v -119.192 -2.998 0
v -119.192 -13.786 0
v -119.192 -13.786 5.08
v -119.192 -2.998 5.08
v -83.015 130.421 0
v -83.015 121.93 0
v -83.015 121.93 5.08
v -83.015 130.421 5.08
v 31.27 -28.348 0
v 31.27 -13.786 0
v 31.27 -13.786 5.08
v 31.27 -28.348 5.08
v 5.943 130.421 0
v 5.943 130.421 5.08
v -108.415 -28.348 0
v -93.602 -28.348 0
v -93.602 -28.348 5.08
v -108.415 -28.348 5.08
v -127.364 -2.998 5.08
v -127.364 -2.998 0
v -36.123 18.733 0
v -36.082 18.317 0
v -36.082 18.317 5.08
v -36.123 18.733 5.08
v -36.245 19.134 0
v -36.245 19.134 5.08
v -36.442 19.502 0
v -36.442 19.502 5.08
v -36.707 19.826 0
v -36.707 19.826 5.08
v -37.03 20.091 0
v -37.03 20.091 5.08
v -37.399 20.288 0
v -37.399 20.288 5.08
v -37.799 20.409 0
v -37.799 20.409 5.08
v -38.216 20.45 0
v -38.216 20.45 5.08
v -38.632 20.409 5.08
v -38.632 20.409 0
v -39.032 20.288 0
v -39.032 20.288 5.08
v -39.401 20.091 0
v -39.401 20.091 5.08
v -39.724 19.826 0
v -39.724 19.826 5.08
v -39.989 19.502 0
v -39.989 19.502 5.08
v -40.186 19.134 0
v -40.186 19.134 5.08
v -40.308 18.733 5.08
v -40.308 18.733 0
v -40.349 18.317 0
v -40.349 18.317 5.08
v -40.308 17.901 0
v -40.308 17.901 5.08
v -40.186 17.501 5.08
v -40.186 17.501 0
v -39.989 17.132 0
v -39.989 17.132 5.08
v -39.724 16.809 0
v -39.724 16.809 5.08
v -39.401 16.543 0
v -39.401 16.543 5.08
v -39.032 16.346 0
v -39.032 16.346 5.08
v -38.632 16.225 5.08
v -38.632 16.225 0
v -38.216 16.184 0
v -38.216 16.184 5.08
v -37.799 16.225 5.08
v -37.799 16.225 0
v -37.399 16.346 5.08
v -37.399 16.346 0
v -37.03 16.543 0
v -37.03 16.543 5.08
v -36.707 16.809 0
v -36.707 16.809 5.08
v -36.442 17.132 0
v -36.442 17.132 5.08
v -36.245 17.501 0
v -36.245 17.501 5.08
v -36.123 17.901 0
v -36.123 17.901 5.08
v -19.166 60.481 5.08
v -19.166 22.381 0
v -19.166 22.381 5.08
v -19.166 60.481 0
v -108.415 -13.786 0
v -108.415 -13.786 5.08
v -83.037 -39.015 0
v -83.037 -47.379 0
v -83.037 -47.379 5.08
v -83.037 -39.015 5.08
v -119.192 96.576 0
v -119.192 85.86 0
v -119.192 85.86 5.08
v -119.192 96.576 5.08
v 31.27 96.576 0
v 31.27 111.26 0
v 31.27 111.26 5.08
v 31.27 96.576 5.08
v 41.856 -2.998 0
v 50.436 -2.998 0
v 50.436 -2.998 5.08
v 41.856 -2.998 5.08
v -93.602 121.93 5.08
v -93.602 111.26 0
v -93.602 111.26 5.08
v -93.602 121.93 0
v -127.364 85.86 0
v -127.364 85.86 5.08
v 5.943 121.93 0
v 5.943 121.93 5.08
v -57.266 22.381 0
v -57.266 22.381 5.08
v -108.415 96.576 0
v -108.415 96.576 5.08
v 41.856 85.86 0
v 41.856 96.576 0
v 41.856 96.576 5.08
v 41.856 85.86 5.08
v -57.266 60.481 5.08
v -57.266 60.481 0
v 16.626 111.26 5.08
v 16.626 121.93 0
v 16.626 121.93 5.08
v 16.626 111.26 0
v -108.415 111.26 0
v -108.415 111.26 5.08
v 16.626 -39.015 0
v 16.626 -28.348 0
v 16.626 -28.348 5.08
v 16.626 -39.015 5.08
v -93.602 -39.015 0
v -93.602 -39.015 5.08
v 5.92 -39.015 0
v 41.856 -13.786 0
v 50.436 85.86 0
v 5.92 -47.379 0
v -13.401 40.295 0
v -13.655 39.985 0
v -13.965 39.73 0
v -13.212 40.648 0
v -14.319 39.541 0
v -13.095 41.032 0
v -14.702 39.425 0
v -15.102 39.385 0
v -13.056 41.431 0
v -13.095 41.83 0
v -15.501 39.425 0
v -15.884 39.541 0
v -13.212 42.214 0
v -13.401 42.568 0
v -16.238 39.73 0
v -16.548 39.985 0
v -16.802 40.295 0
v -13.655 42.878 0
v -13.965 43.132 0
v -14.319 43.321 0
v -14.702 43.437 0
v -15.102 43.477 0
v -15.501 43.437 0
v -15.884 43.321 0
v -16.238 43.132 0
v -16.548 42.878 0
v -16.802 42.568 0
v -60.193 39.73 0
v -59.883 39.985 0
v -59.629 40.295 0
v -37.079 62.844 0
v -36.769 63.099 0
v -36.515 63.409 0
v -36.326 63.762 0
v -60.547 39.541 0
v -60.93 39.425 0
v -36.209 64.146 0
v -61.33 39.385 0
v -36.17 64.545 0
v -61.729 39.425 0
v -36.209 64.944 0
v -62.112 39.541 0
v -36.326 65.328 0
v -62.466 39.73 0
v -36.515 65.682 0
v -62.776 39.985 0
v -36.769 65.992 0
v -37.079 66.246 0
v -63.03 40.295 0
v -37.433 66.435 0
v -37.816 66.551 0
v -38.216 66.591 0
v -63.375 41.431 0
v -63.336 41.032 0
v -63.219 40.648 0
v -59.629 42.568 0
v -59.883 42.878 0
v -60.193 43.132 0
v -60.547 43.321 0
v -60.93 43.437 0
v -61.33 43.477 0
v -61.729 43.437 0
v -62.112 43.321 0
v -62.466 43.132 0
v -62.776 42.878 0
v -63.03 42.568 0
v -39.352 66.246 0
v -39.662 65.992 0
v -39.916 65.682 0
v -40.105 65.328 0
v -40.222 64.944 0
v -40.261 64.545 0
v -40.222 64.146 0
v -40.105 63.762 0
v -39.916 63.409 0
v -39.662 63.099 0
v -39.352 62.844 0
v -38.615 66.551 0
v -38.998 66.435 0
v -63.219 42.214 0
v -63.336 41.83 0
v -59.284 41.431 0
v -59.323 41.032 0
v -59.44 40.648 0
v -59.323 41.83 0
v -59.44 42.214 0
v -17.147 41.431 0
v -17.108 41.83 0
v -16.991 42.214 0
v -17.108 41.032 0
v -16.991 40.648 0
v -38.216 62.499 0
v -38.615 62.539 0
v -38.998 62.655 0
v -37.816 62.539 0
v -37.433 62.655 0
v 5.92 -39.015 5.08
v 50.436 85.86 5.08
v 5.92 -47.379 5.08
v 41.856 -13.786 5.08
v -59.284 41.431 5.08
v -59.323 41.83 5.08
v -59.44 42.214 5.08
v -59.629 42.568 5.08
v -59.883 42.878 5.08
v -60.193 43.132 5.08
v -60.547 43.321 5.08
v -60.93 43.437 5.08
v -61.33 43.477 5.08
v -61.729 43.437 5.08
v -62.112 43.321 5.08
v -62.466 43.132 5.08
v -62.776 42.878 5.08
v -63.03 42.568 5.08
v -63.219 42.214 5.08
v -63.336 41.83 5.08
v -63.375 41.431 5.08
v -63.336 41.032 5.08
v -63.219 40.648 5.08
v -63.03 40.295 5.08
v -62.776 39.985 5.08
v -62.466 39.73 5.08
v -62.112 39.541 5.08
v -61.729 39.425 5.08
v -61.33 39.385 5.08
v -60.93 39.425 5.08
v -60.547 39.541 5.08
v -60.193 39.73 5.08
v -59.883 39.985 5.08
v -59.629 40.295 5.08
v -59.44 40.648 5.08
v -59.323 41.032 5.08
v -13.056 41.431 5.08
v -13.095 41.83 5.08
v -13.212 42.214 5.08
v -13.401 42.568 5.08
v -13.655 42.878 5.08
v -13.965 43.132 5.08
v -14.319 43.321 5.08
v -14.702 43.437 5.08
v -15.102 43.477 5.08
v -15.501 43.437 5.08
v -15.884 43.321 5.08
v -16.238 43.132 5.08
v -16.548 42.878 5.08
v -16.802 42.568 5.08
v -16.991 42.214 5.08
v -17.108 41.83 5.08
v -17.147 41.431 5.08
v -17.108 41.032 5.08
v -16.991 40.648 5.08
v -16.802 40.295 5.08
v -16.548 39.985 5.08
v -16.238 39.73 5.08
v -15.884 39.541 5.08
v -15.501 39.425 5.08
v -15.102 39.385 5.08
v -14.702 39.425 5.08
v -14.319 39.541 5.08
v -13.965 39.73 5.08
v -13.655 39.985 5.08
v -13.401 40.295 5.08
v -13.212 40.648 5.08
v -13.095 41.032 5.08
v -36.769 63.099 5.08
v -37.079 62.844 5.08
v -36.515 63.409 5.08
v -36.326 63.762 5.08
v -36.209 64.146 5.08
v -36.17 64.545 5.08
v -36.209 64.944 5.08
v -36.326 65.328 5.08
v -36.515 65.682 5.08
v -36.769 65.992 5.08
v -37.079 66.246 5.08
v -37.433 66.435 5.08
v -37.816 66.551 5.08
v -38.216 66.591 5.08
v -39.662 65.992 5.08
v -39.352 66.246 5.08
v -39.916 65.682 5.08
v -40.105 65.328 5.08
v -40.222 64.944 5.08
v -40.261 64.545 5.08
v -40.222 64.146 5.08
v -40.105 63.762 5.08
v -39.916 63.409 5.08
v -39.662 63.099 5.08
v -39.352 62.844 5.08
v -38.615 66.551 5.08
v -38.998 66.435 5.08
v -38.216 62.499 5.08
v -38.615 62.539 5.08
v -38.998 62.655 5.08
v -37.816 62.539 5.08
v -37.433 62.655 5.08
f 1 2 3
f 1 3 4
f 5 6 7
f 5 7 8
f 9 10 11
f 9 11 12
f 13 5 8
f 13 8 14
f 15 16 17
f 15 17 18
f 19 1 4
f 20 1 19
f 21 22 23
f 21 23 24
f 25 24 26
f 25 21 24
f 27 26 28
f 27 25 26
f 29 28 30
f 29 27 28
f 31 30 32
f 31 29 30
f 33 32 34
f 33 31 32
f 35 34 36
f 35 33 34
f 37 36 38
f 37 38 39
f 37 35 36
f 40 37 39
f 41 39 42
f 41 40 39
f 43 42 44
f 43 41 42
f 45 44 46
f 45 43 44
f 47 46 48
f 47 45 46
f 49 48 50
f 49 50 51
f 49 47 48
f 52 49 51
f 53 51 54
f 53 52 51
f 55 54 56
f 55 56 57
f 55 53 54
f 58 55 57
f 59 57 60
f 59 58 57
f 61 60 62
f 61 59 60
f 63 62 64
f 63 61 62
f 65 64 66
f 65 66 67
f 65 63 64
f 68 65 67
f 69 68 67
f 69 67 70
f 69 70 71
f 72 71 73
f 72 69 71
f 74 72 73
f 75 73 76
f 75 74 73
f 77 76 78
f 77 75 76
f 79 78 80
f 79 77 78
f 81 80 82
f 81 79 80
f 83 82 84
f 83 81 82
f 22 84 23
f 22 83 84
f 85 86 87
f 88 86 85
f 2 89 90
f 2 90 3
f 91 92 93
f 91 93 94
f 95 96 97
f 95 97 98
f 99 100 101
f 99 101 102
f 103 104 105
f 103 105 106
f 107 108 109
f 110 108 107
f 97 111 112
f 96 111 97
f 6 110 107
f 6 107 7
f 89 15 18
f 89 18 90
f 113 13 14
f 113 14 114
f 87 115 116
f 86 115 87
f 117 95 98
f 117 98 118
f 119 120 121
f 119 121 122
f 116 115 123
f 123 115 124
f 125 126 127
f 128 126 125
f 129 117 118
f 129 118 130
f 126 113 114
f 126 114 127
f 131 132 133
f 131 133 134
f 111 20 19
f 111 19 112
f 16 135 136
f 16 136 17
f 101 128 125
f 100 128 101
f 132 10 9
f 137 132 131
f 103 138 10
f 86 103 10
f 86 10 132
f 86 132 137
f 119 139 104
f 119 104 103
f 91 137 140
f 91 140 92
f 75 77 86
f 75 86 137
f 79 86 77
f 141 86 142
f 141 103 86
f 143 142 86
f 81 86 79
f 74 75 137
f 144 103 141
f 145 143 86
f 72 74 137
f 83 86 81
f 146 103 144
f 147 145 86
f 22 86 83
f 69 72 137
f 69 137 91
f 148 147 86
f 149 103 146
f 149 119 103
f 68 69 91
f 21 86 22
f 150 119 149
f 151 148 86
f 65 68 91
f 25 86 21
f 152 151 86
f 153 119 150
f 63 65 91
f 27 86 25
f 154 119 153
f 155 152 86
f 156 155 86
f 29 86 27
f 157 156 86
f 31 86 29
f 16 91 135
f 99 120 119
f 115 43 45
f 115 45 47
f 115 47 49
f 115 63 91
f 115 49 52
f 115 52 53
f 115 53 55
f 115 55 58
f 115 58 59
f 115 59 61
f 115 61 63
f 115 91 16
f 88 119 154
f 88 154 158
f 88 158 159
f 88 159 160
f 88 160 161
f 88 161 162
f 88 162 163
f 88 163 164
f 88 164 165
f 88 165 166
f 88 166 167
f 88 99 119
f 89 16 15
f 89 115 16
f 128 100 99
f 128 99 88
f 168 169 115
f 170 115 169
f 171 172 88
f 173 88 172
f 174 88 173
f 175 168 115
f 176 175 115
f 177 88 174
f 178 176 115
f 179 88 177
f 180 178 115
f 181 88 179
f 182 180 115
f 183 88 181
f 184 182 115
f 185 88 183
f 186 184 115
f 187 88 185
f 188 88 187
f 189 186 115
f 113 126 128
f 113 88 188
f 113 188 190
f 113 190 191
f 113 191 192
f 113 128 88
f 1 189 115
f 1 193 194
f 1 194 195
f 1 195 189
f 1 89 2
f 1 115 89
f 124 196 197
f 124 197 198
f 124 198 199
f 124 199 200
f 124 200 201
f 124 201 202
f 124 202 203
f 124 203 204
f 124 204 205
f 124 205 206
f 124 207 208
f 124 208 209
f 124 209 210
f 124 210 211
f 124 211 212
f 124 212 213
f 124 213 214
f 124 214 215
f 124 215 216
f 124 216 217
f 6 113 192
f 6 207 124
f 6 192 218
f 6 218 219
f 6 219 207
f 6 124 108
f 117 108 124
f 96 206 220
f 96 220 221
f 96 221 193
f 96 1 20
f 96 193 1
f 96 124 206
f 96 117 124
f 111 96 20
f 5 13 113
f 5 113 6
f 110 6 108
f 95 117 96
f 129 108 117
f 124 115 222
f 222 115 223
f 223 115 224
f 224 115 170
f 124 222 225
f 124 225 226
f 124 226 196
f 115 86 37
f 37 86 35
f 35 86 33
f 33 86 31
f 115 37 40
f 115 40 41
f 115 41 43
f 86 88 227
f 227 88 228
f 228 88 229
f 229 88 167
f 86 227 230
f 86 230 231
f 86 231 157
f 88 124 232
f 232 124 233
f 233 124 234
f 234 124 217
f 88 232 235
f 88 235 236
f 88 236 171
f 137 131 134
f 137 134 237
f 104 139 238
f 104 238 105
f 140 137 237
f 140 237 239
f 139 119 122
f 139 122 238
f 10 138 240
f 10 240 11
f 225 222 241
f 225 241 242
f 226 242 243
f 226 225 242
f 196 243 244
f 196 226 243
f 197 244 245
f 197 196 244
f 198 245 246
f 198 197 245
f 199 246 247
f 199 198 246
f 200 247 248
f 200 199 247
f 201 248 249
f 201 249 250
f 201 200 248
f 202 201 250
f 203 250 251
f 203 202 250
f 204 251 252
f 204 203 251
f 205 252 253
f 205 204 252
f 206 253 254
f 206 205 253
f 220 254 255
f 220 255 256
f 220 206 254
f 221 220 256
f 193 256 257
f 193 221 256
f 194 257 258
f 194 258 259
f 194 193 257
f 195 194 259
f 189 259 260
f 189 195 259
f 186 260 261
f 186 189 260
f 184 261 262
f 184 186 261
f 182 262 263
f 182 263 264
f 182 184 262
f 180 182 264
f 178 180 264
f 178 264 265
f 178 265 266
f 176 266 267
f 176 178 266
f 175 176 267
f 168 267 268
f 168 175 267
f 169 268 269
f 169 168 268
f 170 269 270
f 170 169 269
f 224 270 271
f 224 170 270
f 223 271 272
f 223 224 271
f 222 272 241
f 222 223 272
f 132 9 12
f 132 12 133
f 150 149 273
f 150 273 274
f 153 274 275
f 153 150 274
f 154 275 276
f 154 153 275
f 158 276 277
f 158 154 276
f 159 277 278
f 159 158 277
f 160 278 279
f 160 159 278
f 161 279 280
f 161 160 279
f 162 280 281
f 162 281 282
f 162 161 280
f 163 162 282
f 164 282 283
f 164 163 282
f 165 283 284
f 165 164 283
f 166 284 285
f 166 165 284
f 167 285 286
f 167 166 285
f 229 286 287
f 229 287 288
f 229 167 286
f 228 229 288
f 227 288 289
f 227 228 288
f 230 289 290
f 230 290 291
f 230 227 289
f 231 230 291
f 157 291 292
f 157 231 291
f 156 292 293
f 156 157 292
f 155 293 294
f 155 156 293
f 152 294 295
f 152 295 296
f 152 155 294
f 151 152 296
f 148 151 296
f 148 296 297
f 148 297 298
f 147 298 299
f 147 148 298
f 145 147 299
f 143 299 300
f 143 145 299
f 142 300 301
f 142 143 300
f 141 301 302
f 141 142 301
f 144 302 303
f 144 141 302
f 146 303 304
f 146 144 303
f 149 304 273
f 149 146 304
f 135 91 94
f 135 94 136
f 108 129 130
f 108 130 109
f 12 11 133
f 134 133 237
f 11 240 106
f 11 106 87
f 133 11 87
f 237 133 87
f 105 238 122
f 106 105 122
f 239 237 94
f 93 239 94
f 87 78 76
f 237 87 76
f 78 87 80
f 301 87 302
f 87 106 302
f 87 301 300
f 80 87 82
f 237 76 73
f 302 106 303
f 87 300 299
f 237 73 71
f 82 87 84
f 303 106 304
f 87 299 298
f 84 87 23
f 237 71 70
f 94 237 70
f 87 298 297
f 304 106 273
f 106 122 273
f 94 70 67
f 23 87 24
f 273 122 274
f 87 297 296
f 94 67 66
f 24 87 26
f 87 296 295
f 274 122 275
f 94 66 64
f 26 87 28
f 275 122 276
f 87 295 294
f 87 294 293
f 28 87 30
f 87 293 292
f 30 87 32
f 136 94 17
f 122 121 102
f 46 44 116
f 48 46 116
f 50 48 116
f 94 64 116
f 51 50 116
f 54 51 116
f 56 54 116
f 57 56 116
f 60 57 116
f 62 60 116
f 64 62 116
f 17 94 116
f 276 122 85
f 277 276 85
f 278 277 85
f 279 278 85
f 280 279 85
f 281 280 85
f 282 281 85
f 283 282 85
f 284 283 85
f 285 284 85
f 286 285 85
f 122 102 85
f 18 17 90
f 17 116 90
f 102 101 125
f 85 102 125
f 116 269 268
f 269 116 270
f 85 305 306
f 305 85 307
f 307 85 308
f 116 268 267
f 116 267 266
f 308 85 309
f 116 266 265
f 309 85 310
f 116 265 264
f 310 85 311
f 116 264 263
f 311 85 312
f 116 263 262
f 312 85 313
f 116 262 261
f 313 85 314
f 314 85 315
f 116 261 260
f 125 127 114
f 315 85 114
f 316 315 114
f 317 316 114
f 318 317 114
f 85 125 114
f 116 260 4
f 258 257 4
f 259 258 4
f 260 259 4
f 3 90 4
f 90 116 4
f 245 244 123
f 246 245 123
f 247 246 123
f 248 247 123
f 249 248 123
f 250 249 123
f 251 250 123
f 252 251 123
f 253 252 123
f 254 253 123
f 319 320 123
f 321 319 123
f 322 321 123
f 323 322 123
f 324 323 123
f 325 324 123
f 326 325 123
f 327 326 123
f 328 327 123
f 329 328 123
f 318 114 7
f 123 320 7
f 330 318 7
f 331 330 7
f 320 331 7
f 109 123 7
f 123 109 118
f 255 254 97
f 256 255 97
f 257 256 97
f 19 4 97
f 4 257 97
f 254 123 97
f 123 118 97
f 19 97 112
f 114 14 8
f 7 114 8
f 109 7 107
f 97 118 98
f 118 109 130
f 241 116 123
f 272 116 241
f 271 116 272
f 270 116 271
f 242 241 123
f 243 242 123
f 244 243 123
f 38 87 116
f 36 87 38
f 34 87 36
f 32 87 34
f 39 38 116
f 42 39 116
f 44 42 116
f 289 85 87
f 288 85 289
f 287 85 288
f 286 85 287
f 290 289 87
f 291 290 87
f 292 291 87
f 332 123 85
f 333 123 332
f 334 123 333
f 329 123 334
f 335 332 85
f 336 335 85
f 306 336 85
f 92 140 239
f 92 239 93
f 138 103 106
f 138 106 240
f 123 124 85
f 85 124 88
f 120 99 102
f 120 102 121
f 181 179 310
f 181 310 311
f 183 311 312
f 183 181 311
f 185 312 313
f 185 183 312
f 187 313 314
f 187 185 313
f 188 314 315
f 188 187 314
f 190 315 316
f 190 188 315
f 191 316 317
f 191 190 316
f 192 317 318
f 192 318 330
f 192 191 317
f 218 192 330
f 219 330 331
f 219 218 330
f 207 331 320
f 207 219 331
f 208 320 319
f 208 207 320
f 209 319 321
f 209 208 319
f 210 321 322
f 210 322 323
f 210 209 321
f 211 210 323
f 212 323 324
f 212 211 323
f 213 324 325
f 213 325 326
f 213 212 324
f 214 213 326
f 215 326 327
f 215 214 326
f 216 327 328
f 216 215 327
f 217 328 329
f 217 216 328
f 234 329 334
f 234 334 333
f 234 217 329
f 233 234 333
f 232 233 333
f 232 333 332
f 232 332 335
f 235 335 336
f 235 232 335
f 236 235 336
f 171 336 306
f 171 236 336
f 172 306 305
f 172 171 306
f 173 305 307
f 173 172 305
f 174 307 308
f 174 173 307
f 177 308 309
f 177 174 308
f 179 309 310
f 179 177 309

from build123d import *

# Parameters (mm, degrees)
SKETCH1_R           = 2.045707784
SKETCH1_R_2         = 2.13337502
SKETCH1_W           = 38.1
SKETCH1_H           = 38.1
BOSS_EXTRUDE3_DEPTH = 5.08


with BuildPart() as part:
    # Sketch1 → Boss-Extrude3 (new body)
    with BuildSketch(Plane.XY):
        Polygon((-83.014795154, 130.420630372), (5.943060379, 130.420630372), (5.943060379, 121.930337924), (16.626041869, 121.930337924), (16.626041869, 111.260143372), (31.269563819, 111.260143372), (31.269563819, 96.576116387), (41.855511127, 96.576116387), (41.855511127, 85.860143372), (50.436103152, 85.860143372), (50.436103152, -2.997954724), (41.855511127, -2.997954724), (41.855511127, -13.785983185), (31.269563819, -13.785983185), (31.269563819, -28.34797266), (16.626041869, -28.34797266), (16.626041869, -39.015452444), (5.9203896, -39.015452444), (5.9203896, -47.379369628), (-83.037465933, -47.379369628), (-83.037465933, -39.015452444), (-93.601982027, -39.015452444), (-93.601982027, -28.34797266), (-108.414795154, -28.34797266), (-108.414795154, -13.785983185), (-119.192241536, -13.785983185), (-119.192241536, -2.997954724), (-127.363896848, -2.997954724), (-127.363896848, 85.860143372), (-119.192241536, 85.860143372), (-119.192241536, 96.576116387), (-108.414795154, 96.576116387), (-108.414795154, 111.260143372), (-93.601982027, 111.260143372), (-93.601982027, 121.930337924), (-83.014795154, 121.930337924), align=None)
        with Locations((-61.329510567, 41.431094324)):
            Circle(SKETCH1_R, mode=Mode.SUBTRACT)
        with Locations((-38.215510567, 64.545094324)):
            Circle(SKETCH1_R, mode=Mode.SUBTRACT)
        with Locations((-15.101510567, 41.431094324)):
            Circle(SKETCH1_R, mode=Mode.SUBTRACT)
        with Locations((-38.215510567, 18.317094324)):
            Circle(SKETCH1_R_2, mode=Mode.SUBTRACT)
        with Locations((-38.215510567, 41.431094324)):
            Rectangle(SKETCH1_W, SKETCH1_H, mode=Mode.SUBTRACT)
    extrude(amount=BOSS_EXTRUDE3_DEPTH)


solid = part.part
